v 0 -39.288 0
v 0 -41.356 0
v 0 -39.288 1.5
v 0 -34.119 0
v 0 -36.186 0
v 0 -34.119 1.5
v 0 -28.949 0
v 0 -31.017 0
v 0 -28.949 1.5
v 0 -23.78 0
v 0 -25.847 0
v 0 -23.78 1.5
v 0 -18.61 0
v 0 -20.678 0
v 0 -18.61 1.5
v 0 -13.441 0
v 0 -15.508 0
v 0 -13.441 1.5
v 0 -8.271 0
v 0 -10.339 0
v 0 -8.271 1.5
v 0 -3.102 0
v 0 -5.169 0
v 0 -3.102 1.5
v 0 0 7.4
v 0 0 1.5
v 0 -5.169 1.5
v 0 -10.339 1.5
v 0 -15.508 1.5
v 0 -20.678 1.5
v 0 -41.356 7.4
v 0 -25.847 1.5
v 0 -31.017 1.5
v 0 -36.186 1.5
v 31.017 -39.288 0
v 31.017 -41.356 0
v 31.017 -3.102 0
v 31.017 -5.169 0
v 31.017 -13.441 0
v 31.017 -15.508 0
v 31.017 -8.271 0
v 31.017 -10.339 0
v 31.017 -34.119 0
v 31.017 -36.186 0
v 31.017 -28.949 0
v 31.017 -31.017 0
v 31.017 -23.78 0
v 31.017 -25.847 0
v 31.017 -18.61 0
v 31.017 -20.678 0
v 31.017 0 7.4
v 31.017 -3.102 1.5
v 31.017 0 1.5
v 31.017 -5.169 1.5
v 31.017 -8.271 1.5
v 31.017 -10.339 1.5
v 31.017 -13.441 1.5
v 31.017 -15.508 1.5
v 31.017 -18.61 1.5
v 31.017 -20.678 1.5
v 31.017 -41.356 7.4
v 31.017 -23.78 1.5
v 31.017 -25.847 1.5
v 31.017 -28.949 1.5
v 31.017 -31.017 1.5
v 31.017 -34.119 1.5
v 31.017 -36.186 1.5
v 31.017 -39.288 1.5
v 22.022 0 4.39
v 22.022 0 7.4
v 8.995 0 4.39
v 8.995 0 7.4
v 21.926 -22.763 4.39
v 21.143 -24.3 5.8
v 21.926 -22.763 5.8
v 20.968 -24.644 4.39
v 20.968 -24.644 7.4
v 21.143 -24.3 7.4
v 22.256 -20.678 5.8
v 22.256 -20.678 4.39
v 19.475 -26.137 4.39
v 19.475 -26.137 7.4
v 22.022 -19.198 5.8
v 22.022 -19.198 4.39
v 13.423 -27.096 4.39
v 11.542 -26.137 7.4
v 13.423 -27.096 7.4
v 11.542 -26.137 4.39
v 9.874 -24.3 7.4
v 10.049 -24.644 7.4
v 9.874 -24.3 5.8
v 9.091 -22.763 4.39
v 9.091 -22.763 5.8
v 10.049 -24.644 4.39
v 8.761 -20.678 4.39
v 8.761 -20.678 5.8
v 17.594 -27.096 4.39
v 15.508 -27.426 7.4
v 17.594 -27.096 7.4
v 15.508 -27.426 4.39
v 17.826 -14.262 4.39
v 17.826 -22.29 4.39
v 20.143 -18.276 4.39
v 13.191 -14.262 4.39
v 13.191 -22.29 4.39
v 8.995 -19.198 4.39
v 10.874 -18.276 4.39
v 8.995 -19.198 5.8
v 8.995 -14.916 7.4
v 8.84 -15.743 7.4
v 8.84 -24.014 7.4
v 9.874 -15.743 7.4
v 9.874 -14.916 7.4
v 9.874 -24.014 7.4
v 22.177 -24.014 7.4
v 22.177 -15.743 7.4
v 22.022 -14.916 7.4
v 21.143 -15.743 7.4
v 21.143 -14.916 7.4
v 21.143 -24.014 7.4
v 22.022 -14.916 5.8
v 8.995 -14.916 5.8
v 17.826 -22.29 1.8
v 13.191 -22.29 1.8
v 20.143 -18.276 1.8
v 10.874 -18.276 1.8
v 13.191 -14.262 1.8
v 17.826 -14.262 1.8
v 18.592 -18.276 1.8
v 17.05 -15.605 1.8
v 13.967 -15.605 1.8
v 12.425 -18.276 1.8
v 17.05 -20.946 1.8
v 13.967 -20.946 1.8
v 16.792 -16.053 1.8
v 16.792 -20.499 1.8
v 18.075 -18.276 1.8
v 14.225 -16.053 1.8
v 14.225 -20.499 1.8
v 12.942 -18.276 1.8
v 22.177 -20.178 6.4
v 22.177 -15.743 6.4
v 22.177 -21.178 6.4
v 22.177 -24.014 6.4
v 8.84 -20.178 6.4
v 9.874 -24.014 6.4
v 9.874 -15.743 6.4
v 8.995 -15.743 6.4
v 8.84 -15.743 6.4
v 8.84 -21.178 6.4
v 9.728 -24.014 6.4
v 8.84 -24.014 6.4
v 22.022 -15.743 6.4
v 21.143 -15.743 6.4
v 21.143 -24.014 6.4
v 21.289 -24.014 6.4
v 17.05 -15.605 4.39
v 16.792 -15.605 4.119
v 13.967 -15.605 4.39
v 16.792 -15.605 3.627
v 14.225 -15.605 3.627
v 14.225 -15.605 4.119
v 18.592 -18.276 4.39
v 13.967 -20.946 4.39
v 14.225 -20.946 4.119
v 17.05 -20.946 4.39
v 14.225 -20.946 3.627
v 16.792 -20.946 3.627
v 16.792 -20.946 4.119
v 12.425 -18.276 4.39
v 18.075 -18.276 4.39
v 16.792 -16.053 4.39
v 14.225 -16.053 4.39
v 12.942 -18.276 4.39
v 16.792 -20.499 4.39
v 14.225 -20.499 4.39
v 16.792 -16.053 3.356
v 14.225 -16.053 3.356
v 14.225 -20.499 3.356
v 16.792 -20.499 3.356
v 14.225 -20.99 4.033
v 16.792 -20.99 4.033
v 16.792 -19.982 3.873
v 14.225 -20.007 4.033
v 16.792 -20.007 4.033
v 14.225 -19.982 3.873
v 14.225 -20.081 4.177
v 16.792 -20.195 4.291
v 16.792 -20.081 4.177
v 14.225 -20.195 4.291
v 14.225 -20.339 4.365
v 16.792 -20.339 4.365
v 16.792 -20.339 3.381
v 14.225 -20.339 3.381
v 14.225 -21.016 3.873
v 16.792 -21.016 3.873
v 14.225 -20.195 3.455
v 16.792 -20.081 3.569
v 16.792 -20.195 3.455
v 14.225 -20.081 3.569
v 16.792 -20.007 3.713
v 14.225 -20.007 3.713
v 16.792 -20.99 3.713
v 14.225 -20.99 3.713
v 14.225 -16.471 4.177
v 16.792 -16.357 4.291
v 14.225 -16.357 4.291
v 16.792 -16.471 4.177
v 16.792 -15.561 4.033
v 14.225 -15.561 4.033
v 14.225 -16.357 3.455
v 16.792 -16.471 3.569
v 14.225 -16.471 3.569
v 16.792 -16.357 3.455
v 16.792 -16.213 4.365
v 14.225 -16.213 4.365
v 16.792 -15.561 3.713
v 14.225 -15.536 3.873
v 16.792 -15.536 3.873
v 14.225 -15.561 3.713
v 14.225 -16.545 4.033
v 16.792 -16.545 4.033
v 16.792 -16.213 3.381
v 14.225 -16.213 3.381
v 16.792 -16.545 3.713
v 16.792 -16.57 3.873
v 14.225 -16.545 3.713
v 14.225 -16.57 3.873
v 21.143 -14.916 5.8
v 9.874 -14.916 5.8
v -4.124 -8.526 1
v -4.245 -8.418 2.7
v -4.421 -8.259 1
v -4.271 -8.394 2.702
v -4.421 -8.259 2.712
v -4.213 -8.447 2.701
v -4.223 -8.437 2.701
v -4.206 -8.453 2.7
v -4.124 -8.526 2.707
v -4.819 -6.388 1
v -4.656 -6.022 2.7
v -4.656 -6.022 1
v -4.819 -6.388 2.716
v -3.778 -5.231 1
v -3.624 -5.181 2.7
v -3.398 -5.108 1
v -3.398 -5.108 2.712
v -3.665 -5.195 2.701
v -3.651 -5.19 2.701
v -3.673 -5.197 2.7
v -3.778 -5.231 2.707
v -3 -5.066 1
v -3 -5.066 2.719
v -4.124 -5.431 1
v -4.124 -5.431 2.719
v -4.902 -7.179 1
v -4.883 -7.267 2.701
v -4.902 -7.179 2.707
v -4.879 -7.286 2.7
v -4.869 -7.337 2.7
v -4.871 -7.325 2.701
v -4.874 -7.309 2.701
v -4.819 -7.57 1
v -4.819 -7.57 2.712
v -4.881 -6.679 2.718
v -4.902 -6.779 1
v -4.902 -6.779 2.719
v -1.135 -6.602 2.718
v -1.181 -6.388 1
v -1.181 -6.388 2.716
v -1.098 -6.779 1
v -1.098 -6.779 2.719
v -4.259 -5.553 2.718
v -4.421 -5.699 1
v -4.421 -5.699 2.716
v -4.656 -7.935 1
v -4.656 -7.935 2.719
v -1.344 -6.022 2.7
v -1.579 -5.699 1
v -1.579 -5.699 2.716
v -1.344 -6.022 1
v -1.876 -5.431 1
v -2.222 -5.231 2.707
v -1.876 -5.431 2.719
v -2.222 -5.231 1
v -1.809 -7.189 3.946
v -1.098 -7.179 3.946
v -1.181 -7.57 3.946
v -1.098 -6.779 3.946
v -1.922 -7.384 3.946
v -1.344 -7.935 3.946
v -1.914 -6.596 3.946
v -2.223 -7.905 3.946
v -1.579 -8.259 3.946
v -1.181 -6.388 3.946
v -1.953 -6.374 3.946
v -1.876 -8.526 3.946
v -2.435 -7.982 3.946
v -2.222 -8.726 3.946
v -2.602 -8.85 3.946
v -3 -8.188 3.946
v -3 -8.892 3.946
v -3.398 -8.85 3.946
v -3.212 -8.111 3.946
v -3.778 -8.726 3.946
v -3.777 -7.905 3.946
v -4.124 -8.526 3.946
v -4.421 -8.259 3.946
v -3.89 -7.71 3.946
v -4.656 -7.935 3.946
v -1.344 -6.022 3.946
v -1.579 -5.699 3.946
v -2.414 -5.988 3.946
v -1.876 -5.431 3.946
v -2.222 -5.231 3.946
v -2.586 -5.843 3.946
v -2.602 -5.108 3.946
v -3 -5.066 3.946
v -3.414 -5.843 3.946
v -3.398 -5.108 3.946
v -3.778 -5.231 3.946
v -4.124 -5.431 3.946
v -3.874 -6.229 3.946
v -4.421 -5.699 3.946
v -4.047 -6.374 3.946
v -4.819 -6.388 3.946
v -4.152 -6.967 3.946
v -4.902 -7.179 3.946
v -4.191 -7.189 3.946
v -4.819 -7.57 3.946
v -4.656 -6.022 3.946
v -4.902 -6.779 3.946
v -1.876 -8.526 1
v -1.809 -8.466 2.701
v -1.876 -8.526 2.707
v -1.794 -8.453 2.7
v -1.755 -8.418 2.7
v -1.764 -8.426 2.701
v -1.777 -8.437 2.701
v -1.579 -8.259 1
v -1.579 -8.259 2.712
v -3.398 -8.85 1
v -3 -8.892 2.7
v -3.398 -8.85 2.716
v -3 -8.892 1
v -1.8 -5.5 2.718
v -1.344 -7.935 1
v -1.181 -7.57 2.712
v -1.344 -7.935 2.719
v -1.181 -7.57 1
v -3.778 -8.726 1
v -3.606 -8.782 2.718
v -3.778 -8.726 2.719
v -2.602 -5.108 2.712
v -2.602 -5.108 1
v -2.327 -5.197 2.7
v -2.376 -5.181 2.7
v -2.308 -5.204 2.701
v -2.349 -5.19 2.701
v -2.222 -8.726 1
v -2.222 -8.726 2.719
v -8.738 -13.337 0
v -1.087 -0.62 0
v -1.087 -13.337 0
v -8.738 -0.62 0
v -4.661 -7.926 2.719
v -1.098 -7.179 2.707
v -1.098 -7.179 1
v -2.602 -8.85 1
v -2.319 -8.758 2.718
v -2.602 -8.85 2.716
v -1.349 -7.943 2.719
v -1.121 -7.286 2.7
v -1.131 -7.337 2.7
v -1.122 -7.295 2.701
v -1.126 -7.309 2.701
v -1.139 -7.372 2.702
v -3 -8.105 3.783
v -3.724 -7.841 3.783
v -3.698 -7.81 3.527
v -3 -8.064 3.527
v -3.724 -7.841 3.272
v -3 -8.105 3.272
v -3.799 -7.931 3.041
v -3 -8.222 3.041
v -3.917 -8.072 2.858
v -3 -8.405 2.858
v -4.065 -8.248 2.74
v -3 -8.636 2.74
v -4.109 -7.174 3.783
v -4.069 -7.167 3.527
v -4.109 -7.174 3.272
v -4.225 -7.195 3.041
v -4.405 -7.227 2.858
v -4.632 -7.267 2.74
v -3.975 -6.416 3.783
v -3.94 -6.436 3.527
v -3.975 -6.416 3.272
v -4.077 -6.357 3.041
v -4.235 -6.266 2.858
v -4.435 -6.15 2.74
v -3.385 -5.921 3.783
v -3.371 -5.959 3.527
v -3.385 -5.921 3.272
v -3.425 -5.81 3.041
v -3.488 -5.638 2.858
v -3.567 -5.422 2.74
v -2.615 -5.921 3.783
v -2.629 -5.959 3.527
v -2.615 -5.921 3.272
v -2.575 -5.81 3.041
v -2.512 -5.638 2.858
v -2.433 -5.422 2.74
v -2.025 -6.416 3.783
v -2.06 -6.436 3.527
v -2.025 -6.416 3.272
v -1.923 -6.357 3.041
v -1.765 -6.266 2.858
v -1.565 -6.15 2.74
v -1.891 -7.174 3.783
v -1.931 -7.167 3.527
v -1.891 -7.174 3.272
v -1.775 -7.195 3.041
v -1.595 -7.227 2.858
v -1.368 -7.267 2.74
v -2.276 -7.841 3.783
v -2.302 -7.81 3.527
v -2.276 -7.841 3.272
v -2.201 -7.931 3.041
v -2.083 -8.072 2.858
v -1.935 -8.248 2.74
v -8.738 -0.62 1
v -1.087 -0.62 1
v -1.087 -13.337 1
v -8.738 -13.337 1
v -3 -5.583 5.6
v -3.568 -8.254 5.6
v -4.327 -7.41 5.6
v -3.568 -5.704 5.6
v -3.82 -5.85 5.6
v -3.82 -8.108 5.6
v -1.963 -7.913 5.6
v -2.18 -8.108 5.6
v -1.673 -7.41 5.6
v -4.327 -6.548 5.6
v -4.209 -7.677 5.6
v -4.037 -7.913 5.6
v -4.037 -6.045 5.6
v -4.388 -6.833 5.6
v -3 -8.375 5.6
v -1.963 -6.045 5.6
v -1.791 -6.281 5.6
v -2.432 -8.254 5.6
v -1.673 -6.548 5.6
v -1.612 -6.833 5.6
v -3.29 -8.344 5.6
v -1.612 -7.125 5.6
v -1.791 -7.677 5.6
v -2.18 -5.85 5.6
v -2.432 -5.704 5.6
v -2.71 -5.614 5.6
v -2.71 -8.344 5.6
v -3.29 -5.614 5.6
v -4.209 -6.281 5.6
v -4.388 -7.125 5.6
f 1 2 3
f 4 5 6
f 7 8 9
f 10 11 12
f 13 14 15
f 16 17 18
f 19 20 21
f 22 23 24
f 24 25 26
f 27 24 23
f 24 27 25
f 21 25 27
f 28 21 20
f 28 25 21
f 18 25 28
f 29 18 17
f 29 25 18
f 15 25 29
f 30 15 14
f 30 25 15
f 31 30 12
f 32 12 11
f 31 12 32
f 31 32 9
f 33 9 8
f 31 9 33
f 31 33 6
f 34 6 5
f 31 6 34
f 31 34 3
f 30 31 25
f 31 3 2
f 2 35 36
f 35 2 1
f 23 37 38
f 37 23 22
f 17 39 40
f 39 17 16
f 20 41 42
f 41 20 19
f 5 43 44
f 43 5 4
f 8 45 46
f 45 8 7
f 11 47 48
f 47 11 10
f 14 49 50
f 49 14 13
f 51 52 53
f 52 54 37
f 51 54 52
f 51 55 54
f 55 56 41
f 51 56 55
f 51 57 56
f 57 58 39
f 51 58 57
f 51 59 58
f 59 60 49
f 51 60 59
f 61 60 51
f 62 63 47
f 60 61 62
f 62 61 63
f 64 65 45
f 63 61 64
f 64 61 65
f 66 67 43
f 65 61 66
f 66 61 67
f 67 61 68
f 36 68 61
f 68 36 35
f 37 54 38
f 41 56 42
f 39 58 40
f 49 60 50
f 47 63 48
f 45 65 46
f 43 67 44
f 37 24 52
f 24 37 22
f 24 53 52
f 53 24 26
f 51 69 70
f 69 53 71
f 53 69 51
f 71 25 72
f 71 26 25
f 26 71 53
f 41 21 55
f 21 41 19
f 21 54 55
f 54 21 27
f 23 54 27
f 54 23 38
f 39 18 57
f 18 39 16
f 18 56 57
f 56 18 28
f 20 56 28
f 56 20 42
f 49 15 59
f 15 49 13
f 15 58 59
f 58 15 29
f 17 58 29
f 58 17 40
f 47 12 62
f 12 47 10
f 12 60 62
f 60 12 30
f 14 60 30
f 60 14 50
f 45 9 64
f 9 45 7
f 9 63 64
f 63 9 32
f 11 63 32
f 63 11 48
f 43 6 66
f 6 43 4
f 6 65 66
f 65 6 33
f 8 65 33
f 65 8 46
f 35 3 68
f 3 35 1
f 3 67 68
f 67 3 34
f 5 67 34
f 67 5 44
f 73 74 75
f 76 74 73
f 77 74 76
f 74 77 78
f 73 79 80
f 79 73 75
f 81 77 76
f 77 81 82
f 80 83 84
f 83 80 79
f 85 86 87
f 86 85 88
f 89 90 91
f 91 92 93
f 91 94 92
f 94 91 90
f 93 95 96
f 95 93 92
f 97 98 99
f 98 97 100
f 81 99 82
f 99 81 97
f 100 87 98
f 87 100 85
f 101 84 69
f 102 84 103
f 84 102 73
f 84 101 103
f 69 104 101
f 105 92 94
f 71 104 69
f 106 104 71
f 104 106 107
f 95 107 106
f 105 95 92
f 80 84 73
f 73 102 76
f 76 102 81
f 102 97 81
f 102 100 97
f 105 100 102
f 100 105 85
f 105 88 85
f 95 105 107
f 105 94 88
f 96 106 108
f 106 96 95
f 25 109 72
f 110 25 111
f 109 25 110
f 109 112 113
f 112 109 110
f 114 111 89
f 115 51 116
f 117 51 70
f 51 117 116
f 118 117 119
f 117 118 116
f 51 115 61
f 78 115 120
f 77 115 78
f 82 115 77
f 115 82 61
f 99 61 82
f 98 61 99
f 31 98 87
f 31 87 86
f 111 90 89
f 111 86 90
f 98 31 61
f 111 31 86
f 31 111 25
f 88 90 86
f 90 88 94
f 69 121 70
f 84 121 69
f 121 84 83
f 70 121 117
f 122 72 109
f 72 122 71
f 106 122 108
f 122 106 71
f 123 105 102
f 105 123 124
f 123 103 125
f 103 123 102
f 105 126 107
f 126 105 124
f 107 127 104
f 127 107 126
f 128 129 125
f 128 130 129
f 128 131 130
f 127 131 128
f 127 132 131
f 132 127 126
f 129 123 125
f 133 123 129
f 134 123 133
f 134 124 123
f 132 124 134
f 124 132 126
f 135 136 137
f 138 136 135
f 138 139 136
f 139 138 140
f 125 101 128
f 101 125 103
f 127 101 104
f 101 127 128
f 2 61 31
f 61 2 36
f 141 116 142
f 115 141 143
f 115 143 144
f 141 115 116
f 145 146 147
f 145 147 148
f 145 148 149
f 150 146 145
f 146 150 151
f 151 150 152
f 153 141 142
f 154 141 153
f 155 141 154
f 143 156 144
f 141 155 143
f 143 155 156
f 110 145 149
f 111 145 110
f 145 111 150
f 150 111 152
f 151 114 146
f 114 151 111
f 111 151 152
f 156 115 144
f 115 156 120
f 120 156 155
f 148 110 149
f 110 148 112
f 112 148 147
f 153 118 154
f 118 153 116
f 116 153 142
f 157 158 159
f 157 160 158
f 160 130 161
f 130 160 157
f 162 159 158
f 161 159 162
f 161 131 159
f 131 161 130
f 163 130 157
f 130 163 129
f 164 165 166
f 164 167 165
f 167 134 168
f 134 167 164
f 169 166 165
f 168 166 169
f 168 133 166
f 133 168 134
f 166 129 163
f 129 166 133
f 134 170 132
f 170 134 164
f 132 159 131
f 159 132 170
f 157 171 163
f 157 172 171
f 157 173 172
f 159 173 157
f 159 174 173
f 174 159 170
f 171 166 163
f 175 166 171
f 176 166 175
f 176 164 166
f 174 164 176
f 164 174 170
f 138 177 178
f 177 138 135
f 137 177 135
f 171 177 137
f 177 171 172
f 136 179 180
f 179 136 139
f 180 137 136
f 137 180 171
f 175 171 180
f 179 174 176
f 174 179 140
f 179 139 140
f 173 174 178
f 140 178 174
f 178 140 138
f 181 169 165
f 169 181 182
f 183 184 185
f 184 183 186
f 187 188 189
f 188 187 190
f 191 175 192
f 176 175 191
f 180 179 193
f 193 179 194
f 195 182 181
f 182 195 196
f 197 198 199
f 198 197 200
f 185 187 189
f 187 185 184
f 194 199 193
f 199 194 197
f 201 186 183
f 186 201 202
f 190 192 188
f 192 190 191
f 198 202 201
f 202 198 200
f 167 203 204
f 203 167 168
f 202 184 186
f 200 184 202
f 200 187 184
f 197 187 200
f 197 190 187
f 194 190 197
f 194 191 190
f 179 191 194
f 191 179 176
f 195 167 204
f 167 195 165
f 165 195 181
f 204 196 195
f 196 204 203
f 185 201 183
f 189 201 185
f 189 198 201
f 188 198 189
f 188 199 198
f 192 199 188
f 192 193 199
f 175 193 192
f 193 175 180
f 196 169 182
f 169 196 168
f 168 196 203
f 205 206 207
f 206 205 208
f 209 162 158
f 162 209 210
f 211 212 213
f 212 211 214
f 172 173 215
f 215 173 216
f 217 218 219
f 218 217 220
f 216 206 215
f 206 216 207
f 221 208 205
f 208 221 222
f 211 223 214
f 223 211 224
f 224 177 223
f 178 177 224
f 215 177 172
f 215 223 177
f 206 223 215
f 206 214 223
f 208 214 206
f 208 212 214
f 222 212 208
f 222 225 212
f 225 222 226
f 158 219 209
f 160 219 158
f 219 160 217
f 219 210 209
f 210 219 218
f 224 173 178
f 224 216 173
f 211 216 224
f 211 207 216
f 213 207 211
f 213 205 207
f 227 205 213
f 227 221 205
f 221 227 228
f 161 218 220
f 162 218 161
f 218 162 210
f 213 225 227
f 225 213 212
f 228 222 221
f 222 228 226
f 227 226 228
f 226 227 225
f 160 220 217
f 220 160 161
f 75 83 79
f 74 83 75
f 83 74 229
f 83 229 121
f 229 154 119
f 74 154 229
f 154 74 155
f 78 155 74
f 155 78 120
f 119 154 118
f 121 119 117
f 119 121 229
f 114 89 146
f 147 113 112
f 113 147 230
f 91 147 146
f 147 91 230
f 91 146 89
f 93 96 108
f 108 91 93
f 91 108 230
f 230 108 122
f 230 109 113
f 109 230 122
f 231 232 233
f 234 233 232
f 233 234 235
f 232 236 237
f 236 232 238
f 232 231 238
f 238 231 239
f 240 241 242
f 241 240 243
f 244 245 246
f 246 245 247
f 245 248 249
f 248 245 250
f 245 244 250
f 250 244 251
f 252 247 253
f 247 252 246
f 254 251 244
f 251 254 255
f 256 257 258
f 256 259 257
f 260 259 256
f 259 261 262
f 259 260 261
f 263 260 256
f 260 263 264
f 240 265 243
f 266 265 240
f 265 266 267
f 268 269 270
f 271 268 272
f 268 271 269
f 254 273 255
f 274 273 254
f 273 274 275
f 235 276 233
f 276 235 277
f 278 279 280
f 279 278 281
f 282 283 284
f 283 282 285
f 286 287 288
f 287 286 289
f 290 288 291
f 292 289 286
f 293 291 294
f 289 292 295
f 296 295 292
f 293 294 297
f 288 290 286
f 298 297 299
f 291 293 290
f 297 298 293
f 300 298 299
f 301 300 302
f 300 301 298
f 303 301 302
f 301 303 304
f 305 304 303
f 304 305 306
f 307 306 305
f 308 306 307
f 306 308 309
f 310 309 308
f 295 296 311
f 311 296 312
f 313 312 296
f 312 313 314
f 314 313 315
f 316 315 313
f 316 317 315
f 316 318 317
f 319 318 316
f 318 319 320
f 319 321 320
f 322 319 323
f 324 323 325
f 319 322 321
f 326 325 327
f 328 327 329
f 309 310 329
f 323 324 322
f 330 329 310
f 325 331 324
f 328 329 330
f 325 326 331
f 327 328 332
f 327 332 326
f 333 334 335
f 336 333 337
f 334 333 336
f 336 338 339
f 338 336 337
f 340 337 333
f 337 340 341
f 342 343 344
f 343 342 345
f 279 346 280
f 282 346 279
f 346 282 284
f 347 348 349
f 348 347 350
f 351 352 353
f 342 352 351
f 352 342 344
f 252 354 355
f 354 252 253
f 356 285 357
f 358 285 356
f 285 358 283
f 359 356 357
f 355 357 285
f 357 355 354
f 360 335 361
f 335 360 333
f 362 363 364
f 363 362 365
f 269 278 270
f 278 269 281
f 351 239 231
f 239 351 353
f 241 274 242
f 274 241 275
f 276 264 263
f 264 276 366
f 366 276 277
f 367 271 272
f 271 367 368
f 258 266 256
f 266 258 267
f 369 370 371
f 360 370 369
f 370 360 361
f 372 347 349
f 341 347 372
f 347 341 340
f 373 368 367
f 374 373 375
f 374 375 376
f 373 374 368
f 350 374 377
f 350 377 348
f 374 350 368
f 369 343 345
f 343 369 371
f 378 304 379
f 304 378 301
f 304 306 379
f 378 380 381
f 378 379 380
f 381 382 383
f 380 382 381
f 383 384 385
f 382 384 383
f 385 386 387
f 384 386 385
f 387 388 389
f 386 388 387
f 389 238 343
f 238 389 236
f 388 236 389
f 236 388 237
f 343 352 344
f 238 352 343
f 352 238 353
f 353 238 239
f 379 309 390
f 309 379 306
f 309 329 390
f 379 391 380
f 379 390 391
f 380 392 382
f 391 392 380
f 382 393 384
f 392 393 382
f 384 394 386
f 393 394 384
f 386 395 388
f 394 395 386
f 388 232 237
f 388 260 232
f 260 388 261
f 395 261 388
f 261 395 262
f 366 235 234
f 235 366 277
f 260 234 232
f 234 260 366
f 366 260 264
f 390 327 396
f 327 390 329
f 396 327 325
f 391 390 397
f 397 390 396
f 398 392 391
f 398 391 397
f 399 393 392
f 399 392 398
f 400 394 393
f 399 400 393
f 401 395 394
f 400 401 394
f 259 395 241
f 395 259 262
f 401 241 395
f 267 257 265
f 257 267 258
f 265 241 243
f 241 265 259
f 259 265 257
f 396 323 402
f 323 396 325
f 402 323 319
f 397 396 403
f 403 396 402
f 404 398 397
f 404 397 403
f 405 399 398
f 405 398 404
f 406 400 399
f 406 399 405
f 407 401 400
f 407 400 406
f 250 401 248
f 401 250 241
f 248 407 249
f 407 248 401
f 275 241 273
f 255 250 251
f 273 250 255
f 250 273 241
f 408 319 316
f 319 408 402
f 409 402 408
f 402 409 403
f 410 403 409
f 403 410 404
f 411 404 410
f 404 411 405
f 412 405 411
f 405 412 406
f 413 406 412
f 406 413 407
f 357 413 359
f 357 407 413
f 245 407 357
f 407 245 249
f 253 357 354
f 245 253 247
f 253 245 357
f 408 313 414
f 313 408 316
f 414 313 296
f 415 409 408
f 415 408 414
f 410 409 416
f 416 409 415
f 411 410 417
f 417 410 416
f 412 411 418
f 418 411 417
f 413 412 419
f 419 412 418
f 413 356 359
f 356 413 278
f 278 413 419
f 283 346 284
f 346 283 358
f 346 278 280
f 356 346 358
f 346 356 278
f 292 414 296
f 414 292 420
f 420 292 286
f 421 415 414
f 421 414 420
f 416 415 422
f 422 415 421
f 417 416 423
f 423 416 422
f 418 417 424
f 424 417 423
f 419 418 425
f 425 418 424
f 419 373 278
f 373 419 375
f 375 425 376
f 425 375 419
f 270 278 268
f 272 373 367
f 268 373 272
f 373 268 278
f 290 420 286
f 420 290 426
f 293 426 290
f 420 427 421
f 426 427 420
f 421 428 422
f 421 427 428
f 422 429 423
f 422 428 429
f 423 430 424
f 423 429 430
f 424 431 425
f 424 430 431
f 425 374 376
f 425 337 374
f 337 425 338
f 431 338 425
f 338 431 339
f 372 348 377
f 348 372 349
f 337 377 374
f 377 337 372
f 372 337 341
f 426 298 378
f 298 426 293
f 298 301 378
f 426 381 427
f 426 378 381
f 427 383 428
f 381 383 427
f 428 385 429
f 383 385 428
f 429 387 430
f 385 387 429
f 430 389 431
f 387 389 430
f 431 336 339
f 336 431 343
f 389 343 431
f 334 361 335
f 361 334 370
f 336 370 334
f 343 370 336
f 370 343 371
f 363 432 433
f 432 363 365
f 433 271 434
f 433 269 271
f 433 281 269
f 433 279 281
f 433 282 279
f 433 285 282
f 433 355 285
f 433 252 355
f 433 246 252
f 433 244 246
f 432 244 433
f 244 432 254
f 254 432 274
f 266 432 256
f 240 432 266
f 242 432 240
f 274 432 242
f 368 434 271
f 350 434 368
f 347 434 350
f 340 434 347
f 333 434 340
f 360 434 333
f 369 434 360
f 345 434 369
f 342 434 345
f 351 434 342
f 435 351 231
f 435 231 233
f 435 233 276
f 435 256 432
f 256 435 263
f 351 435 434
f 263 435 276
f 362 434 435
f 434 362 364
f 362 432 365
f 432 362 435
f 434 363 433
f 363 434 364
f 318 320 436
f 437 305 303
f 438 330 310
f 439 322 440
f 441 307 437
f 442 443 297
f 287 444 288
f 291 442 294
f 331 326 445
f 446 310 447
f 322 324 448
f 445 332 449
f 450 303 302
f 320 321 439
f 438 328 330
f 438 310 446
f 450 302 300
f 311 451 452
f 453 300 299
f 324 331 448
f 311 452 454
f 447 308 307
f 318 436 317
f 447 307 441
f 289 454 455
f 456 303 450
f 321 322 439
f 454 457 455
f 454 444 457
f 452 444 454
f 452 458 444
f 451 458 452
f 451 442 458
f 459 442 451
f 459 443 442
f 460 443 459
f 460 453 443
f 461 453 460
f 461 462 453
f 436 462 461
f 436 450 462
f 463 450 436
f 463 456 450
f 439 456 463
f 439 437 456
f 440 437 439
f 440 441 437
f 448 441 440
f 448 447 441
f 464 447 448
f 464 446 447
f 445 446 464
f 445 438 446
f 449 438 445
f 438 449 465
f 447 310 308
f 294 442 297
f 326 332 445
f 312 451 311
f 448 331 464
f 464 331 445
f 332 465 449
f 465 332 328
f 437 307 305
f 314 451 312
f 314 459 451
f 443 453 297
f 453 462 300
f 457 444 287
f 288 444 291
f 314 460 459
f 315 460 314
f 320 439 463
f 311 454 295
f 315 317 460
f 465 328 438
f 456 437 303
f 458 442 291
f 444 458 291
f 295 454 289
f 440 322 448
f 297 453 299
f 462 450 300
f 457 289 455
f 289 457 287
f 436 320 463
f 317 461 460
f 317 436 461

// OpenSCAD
// Constant/Utility
inch_from_mm = 25.4; // we assume units are mm below
function polyRad(innerRad, fn) = innerRad/cos(180/fn);
function aPolyRad(outerRad, fn) = outerRad*tan(180/fn);

// Printer variables
mm = 1.033898305084746; // Account for 1 unit not quite being mm
zmm = 1;
extrude_width = 0.5*mm;
clearance = 0.3*mm;

// Measurements
s_thick = 0.2*zmm; // thickness of small
l_thick = 0.9*zmm; // thickness of large
lw = 12.3*mm;     // width of large
sw =  8.8*mm;     // width of small
so = 3.7*mm;      // to end of small
lo = 6.7*mm;      // to end of large
hole_diam = 4*mm-clearance;

// Dimensions
hole_fn = 6;

foot_width = 30*mm;
foot_height = 40*mm;
foot_thick = 7.4*zmm;

groove_depth = 1.5*zmm;
groove_width = 3*mm;
groove_space = 2*mm;
groove_shape = 1; // 1 = square, 2 = v-shape

clip_give = 0.3*hole_diam;
clip_width = 2*hole_diam;
clip_inset = 1*zmm;
clip_top = clip_inset+0.6*zmm;
clip_thru = s_thick+l_thick+clearance;
clip_height = clip_top+4*zmm;
clip_fn = 20;

bracket_length = 12.1*mm;
bracket_width = extrude_width*2;

snap_rad = extrude_width;

module clip_slot() {
    translate([foot_width/2-lw/2-clearance,
               foot_height/2
                    +polyRad(lw/2,20)
                    -lo
                    -hole_diam
                    -2*clearance,
               0]) {
        cube([lw+2*clearance,
              clip_width+2*clearance,
              clip_inset]);
    }
    
}

// Model
module foot() {
    difference() {
        // Chasis
        cube([foot_width,foot_height,foot_thick]);
        // Ribs
        for (i = [0
                 :groove_width+groove_space
                 :foot_height]
            ) {
            translate([0,i,foot_thick])
            rotate([0,90,0])
            linear_extrude(height=foot_width)
            if (groove_shape == 2) {
                polygon(points=[
                    [0,0],
                    [groove_depth,groove_width/2],
                    [0,groove_width]]
                );
            } else {
                square([groove_depth,groove_width]);
            }
        }
        // Opening for attachment
        translate([foot_width/2,foot_height/2,0]) {
            // rounded end
            cylinder(h=clip_thru+clip_top,
                     r=polyRad(lw/2,20)+clearance, 
                     $fn=20);
            // bulk of it
            translate([-(lw+clearance)/2,
                       -(foot_height+clearance)/2,
                       0])
            cube([lw+clearance,
                  (foot_height+clearance)/2,
                  clip_thru+clip_top]);
            // space for snap mount to flex
            translate([0,
                       polyRad(lw/2,20)+clearance
                           -lo
                           -hole_diam/2-clearance,
                       clip_top+clip_thru])
            cylinder(h=clip_height-clip_top-clip_thru,
                     r=polyRad(hole_diam/2+clearance,
                               hole_fn)
                        +4*extrude_width,
                     $fn=hole_fn);
        }
        
        clip_slot();
    }
    
    // clip snap mount
    translate([foot_width/2,
               foot_height/2
                    +polyRad(lw/2,20)+clearance
                    -lo-hole_diam/2-clearance,
               clip_top+clip_thru])
    difference() {
        cylinder(h=clip_height-clip_thru-clip_top,
                 r=polyRad(hole_diam/2+clearance,
                           hole_fn)
                        +extrude_width,
                 $fn=hole_fn);
        cylinder(h=clip_height-clip_top-clip_thru,
                 r=polyRad(hole_diam/2+clearance,                       hole_fn),
                 $fn=hole_fn);
    }
    
    // snap
    translate([foot_width/2
                    -tan(180/hole_fn)
                    *(hole_diam/2+clearance),
               foot_height/2
                    +polyRad(lw/2,20)+clearance
                    -lo
                    -hole_diam/2-clearance,
               clip_top+clip_thru+snap_rad]) {
        // One side...
        translate([0,
                   hole_diam/2+clearance,
                   0])
        rotate([0,90,0])
        cylinder(h=2*tan(180/hole_fn)*
                   (hole_diam/2+clearance),
                 r=snap_rad,
                 $fn=20);
        // ... and the other.
        translate([0,
                   -hole_diam/2-clearance,
                   0])
        rotate([0,90,0])
        cylinder(h=2*tan(180/hole_fn)*
                   (hole_diam/2+clearance),
                 r=snap_rad,
                 $fn=20);
    }
    
    // bracket
    difference() {
        translate([foot_width/2,
                   foot_height/2
                        +polyRad(lw/2,20)
                        +clearance
                        -bracket_length,
                   0])
        union() {
            // One side
            translate([lw/2
                       -bracket_width
                       +clearance,0,0])
            cube([bracket_width+2,
                  bracket_length,
                  clip_top]);
            // Other side
            translate([-lw/2-clearance-2,0,0])
            cube([bracket_width+2,
                  bracket_length,
                  clip_top]);
        }
        clip_slot();
    }
}
module clip() {
    translate([-lw/2,
               -hole_diam/2,
               0])
    cube([lw,
          clip_width,
          clip_inset]);
//    cylinder(h=clip_inset, r=clip_rad, $fn=clip_fn);
    difference() {
        cylinder(h=clip_height-(snap_rad+clearance)*2,
                 r=hole_diam/2,
                 $fn=30);
        translate([0,0,clip_top+clip_thru+snap_rad])
        rotate_extrude(convexity=10)
        translate([hole_diam/2,0,0])
        circle(r=snap_rad+clearance, $fn=20);
    }
    translate([0,0,
               clip_height-(snap_rad+clearance)*2])
    cylinder(h=(snap_rad+clearance)*2,
             r1=hole_diam/2,
             r2=hole_diam/2-snap_rad,
             $fn=30);
}

// actually produce one (could have more)
translate([0,0,foot_thick])
rotate([180,0,0])
foot();

translate([-3,-lw/2-clearance*2,0])
rotate([0,0,90])
clip();
